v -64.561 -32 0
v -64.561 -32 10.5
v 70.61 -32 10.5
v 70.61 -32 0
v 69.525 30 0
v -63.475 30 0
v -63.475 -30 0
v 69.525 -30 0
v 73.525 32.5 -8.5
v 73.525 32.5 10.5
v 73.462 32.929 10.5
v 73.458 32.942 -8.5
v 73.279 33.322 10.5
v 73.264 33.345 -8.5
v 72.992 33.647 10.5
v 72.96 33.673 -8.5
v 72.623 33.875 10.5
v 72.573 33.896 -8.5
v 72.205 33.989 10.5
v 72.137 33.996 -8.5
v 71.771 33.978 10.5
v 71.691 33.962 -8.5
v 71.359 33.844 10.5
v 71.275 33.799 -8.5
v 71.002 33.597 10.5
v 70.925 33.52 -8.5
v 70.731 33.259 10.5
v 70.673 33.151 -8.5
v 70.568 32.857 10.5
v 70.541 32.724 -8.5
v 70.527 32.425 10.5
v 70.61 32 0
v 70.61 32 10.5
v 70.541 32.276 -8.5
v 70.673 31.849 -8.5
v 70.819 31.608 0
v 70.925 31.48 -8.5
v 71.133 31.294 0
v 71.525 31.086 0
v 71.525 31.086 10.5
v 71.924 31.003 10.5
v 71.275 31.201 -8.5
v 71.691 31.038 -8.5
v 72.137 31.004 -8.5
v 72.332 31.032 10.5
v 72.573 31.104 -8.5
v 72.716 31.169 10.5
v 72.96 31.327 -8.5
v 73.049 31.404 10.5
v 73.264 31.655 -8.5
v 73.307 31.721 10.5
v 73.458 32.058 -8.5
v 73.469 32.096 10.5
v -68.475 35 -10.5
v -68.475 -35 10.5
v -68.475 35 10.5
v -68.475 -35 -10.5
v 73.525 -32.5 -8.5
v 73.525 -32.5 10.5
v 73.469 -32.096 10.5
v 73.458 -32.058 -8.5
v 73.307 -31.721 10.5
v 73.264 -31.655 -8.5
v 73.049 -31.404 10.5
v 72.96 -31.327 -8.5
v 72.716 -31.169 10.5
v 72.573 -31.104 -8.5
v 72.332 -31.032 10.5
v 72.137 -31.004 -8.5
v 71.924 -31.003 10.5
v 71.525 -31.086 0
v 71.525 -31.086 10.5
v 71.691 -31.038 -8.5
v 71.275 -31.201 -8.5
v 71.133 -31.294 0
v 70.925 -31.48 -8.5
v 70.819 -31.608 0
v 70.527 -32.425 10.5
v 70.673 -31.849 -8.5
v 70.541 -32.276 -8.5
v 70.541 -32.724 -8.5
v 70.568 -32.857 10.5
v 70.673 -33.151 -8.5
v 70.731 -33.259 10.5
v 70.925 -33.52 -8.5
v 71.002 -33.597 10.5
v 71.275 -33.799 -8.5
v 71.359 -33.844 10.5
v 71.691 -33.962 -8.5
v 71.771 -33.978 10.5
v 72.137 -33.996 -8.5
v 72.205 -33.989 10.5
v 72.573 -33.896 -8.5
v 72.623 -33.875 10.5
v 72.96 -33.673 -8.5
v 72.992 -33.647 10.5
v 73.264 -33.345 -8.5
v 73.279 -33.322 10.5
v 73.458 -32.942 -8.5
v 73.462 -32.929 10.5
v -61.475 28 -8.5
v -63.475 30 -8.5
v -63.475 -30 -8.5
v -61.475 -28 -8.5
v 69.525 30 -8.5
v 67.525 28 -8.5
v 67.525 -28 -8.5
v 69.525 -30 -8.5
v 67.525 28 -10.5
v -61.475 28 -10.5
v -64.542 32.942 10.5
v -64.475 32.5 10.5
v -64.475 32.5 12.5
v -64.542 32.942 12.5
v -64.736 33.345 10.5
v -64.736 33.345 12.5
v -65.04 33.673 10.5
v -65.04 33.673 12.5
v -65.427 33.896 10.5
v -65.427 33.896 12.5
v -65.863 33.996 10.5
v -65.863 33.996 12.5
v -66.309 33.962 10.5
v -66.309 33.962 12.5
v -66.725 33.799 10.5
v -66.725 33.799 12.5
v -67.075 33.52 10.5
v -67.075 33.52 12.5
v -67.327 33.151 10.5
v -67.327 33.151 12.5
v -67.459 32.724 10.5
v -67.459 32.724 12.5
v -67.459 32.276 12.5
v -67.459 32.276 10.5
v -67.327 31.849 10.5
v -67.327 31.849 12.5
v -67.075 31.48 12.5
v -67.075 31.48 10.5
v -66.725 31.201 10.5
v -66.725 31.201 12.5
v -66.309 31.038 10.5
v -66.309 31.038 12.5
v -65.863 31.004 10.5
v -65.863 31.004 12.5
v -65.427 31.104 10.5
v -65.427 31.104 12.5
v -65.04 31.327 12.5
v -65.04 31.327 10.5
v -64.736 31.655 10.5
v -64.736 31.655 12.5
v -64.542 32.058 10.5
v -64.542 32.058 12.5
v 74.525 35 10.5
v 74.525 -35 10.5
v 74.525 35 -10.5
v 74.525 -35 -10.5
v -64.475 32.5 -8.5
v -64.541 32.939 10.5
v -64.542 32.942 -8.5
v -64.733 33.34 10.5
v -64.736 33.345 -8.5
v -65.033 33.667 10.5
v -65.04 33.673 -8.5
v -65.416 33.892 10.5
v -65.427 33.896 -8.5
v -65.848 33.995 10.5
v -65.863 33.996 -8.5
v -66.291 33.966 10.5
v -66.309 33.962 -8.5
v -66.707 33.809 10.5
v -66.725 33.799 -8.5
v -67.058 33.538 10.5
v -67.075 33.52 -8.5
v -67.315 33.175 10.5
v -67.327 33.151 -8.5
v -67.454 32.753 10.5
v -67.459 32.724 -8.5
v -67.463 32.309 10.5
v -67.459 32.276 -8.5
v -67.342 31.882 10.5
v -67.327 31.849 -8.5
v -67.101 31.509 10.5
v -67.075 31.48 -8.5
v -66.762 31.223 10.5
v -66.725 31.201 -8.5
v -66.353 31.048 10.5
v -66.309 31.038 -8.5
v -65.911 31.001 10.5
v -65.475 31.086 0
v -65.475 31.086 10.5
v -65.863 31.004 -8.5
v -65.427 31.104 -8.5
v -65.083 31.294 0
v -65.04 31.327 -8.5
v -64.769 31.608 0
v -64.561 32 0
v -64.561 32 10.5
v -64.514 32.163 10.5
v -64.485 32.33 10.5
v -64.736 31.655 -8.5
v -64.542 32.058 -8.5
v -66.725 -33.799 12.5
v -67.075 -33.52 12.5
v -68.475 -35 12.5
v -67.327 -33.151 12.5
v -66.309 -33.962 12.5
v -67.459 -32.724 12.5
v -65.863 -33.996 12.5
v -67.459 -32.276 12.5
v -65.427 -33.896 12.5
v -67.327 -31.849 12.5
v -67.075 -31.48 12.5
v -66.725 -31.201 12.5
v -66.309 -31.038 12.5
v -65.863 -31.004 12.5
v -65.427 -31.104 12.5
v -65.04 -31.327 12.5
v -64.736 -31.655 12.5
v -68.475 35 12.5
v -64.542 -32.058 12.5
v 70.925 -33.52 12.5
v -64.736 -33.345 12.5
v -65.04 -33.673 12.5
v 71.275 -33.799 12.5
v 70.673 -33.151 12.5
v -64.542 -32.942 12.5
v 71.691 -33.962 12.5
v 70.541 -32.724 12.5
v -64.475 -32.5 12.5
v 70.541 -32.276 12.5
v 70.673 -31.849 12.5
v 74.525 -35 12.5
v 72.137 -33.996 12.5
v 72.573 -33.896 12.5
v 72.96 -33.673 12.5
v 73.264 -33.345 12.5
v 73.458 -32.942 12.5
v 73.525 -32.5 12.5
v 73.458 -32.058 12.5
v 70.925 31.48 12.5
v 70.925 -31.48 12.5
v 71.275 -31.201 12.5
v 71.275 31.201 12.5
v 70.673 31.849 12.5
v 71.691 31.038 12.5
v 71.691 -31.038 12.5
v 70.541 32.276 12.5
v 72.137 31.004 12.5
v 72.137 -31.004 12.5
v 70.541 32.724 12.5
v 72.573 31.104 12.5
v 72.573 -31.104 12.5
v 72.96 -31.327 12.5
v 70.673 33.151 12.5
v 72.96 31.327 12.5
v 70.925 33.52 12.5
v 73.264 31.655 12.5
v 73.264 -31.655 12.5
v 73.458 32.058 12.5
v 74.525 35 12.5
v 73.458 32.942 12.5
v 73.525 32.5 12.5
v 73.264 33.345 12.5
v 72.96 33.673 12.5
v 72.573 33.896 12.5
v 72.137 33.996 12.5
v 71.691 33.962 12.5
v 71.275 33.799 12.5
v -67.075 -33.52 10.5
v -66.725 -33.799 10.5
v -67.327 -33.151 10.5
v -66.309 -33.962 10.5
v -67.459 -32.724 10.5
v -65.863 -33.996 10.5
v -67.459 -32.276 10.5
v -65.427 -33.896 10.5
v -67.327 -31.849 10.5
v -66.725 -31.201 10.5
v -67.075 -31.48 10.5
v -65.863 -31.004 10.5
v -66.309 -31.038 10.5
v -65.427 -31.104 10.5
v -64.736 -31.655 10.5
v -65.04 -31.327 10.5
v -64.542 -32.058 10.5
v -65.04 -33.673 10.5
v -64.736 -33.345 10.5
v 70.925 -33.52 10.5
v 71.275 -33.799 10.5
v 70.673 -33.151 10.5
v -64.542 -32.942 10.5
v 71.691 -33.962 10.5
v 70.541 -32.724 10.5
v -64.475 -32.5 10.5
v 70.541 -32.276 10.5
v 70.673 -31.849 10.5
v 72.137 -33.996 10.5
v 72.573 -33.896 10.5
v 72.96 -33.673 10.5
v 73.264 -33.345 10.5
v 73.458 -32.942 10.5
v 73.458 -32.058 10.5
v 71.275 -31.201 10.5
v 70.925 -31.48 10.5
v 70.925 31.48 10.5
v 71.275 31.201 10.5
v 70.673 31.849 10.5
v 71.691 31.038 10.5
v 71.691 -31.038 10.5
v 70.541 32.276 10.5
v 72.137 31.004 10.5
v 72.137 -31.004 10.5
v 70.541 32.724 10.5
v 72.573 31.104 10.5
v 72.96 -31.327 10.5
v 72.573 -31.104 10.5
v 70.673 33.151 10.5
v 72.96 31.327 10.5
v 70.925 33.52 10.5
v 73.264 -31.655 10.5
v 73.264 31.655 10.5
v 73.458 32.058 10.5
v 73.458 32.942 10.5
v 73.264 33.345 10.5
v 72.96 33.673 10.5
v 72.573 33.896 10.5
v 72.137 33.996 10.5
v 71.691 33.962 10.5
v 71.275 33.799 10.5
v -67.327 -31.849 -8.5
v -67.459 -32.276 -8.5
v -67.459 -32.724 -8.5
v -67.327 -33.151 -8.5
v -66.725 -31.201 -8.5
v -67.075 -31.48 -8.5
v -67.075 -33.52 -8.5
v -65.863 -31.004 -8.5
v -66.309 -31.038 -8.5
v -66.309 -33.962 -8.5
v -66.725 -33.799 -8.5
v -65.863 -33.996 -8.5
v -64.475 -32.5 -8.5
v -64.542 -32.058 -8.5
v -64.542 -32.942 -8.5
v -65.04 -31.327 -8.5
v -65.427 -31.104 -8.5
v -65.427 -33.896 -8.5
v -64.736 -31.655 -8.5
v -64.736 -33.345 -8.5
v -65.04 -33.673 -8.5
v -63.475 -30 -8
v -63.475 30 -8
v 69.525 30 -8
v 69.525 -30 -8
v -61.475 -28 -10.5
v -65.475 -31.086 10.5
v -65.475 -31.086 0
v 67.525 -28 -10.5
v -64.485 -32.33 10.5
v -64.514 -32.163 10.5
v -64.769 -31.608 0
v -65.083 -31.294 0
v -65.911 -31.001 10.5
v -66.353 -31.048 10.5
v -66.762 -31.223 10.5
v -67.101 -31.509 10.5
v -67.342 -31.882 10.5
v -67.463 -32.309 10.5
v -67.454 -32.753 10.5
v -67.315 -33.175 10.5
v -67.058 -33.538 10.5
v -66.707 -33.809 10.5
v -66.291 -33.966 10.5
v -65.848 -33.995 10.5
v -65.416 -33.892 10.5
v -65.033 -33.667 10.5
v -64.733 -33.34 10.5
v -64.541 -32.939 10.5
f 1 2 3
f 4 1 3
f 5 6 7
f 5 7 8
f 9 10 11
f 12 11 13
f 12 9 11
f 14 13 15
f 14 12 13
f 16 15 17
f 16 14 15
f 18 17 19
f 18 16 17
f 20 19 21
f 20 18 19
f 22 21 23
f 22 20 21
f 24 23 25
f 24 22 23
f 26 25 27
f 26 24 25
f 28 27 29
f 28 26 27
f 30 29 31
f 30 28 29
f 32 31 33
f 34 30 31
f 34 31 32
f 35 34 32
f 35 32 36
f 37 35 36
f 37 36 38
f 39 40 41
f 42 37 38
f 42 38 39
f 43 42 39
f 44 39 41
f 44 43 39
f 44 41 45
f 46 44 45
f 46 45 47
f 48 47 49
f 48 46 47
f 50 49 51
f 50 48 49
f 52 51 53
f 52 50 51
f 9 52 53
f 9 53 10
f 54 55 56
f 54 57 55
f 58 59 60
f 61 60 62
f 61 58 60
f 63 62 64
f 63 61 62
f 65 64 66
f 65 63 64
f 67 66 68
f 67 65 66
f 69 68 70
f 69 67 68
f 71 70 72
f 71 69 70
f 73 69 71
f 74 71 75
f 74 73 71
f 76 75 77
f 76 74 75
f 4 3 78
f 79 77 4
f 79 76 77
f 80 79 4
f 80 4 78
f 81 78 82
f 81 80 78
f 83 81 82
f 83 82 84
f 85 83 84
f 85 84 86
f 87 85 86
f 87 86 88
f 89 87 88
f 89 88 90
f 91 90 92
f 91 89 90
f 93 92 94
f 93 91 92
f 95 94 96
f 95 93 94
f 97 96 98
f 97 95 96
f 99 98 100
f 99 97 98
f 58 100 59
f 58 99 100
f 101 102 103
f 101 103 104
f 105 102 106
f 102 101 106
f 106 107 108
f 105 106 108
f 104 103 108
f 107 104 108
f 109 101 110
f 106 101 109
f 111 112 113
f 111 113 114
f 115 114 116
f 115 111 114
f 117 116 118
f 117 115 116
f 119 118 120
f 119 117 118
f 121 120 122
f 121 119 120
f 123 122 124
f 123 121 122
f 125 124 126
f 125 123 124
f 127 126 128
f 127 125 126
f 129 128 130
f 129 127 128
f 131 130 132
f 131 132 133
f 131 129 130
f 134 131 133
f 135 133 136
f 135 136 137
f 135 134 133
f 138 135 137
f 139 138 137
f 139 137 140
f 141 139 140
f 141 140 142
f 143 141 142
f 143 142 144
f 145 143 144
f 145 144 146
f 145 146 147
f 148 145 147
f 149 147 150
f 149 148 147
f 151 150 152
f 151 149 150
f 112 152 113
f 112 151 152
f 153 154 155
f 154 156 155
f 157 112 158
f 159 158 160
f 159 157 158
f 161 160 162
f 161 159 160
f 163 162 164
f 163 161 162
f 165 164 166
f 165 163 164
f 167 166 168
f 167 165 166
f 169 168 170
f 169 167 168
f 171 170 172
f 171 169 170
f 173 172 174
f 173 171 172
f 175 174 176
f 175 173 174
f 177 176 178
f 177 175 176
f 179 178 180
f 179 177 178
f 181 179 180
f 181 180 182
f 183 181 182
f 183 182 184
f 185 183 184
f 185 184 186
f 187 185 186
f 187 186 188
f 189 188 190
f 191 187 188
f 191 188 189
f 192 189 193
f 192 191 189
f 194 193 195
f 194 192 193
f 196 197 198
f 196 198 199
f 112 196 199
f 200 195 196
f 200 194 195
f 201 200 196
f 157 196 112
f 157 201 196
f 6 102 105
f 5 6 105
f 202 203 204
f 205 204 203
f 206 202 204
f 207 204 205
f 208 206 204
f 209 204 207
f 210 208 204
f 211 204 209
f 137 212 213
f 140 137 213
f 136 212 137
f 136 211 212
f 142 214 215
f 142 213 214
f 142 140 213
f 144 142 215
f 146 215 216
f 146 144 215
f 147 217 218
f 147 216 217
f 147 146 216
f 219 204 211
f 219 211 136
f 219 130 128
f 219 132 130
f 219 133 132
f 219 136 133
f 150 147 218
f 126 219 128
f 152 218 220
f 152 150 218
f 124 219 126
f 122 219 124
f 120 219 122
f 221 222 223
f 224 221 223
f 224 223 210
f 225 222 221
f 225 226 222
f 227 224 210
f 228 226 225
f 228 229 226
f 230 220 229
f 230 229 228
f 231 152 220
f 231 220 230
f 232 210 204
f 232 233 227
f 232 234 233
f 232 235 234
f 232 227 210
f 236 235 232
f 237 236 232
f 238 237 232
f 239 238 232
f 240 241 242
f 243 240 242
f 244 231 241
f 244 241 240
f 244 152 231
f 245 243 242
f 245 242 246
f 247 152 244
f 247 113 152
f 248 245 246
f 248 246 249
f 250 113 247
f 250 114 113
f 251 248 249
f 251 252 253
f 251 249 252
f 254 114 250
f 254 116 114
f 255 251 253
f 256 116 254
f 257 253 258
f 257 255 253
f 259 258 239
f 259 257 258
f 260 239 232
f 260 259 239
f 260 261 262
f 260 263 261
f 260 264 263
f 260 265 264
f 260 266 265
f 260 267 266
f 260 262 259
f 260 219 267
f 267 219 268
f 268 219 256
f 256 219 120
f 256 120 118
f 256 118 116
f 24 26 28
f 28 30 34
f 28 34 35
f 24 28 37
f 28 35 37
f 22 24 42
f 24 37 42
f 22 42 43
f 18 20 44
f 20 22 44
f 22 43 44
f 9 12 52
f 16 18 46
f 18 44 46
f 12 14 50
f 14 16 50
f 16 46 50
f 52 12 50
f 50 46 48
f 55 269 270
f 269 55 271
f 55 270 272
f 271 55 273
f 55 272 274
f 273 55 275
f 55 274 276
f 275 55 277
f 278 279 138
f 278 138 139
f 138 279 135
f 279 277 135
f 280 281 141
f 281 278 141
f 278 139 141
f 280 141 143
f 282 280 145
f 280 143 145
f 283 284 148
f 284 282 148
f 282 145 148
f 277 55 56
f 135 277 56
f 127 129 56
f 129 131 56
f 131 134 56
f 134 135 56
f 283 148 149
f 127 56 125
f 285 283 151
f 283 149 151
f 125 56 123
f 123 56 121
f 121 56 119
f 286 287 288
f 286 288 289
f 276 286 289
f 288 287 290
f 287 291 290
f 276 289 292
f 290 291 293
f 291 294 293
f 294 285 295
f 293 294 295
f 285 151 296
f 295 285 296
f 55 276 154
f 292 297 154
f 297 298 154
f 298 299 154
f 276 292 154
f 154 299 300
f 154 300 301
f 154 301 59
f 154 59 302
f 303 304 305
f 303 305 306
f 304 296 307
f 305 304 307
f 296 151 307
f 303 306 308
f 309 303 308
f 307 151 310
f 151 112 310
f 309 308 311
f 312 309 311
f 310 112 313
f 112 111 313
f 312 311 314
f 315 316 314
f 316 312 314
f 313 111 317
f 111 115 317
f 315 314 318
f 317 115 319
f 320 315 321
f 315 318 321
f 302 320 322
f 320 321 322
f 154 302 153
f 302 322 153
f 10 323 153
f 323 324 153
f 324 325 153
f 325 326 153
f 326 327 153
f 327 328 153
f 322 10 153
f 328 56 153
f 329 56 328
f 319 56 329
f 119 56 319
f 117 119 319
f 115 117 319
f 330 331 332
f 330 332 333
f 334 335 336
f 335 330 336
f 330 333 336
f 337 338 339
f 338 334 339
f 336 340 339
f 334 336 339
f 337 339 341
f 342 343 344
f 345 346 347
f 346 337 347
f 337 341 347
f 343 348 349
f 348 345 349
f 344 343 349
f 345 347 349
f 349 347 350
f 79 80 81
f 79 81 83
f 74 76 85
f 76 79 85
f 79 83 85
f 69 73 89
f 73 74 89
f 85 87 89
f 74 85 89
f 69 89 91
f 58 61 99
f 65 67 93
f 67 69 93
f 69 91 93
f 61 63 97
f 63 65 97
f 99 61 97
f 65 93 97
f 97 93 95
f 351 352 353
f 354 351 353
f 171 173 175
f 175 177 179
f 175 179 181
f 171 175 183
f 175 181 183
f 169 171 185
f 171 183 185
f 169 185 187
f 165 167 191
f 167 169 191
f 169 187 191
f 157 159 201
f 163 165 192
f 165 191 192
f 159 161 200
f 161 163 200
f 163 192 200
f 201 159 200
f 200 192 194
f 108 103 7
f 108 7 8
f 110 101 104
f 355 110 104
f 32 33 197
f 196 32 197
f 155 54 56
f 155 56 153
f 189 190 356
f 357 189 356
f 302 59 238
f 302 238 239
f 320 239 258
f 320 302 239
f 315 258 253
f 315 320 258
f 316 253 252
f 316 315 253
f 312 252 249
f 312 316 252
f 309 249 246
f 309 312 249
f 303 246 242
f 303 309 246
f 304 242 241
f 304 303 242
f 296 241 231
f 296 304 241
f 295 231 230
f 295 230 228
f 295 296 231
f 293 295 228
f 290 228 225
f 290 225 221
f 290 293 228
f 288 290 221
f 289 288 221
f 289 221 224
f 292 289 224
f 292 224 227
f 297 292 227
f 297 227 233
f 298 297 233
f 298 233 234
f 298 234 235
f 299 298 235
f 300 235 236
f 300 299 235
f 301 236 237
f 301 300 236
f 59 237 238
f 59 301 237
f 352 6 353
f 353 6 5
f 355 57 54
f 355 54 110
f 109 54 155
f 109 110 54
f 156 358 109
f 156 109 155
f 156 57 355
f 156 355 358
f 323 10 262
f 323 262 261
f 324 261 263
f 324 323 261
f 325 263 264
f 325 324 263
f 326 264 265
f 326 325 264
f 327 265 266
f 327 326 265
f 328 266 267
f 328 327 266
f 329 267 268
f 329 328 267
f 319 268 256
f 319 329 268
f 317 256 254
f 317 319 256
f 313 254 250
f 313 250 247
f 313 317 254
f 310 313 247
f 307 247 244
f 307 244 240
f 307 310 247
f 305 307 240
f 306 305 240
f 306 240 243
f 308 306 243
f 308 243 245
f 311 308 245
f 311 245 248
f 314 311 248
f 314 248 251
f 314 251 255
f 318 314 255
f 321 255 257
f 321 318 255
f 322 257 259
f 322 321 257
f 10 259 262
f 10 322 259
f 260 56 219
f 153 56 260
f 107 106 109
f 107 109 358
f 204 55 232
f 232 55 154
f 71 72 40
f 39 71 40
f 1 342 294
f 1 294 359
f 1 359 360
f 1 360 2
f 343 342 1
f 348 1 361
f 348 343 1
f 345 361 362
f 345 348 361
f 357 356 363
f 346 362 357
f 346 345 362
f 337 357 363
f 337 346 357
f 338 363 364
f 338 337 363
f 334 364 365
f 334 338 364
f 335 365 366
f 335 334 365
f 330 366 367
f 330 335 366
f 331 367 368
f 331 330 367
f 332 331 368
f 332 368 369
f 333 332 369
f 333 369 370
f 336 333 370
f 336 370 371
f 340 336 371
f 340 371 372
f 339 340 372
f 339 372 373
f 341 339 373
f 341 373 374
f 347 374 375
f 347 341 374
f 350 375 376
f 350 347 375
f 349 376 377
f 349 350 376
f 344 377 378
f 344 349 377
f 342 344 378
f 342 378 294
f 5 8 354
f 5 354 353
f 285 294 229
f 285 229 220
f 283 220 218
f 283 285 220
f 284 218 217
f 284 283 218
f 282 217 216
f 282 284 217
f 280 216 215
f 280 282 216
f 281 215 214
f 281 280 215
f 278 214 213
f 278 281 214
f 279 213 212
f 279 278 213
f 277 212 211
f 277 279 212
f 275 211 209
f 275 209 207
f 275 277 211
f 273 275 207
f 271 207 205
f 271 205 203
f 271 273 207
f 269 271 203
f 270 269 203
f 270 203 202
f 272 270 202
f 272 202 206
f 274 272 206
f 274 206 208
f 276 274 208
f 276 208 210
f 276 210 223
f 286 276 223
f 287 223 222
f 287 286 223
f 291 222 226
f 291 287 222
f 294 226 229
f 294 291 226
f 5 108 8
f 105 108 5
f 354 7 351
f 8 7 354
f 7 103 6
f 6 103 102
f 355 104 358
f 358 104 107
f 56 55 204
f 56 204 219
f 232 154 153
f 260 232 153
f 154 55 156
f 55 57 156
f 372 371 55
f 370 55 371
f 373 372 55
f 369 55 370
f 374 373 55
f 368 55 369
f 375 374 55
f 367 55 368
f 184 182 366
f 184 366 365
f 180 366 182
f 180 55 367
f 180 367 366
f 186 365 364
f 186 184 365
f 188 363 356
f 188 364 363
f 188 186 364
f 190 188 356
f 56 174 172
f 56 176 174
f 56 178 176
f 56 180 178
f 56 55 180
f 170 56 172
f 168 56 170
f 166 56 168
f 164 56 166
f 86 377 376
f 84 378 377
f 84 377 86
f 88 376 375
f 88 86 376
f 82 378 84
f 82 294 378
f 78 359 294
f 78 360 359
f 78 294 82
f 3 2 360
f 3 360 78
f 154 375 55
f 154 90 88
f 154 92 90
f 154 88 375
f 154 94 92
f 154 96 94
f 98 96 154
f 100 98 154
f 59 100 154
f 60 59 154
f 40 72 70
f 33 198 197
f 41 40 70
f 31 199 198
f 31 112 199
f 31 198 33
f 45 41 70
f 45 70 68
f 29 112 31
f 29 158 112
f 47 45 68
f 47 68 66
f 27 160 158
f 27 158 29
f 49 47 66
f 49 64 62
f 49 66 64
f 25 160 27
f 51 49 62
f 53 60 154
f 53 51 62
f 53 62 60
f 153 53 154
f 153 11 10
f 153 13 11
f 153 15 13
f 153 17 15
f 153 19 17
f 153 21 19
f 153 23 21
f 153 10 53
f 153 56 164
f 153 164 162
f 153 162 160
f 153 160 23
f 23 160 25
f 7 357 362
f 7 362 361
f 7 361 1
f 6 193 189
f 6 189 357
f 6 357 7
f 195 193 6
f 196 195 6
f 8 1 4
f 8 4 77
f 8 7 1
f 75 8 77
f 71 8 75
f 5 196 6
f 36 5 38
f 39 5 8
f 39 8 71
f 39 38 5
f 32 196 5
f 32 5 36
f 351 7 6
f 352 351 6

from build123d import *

# Parameters (mm, degrees)
F0_W     = 133
F0_H     = 60
F1_DEPTH = 8
F0_W_2   = 143
F0_H_2   = 70
F0_R     = 1.5
F2_DEPTH = 8.5
F3_W     = 143
F3_H     = 70
F3_W_2   = 129
F3_H_2   = 56
F4_DEPTH = 2
F5_DEPTH = 10.5
F6_W     = 133
F6_H     = 60
F7_DEPTH = 10.5
F8_W     = 143
F8_H     = 70
F8_R     = 1.5
F9_DEPTH = 2


# Not quite as in the source:
# - a feature names something its author has since deleted; it is built from what else it names


with BuildPart() as f1:
    # F0 (on Top) → F1 (new body)
    with BuildSketch(Plane.XY):
        with Locations((3.0246927018, 0)):
            Rectangle(F0_W, F0_H)
    extrude(amount=-F1_DEPTH)


with BuildPart() as f2:
    # F0 (on Top) → F2 (new body)
    with BuildSketch(Plane.XY):
        with Locations((3.0246927018, 0)):
            Rectangle(F0_W_2, F0_H_2)
        with Locations((-65.9753072982, -32.5)):
            Circle(F0_R, mode=Mode.SUBTRACT)
        with Locations((72.0246927018, -32.5)):
            Circle(F0_R, mode=Mode.SUBTRACT)
        with Locations((-65.9753072982, 32.5)):
            Circle(F0_R, mode=Mode.SUBTRACT)
        with Locations((3.0246927018, 0)):
            Rectangle(F0_W, F0_H, mode=Mode.SUBTRACT)
        with Locations((72.0246927018, 32.5)):
            Circle(F0_R, mode=Mode.SUBTRACT)
    extrude(amount=-F2_DEPTH)

    # F3 (on face) → F4 (join)
    with BuildSketch(Plane(origin=(0, 0, -8.5), x_dir=(1, 0, 0), z_dir=(0, 0, -1))):
        with Locations((3.0246927018, 0)):
            Rectangle(F3_W, F3_H)
        with Locations((3.0246927018, 0)):
            Rectangle(F3_W_2, F3_H_2, mode=Mode.SUBTRACT)
    extrude(amount=F4_DEPTH)

    # F0 (on Top) → F5 (join)
    with BuildSketch(Plane.XY):
        with Locations((3.0246927018, 0)):
            Rectangle(F0_W_2, F0_H_2)
        with Locations((-65.9753072982, -32.5)):
            Circle(F0_R, mode=Mode.SUBTRACT)
        with Locations((72.0246927018, -32.5)):
            Circle(F0_R, mode=Mode.SUBTRACT)
        with Locations((-65.9753072982, 32.5)):
            Circle(F0_R, mode=Mode.SUBTRACT)
        with Locations((3.0246927018, 0)):
            Rectangle(F0_W, F0_H, mode=Mode.SUBTRACT)
        with Locations((72.0246927018, 32.5)):
            Circle(F0_R, mode=Mode.SUBTRACT)
    extrude(amount=F5_DEPTH)

    # F6 (on face) → F7 (cut)
    with BuildSketch(Plane.XY.offset(10.5)):
        with BuildLine():
            ThreePointArc((-64.5610937358, 32), (-64.9146471264, 31.4393398282), (-65.4753072982, 31.0857864376))
            Line((-65.4753072982, 31.0857864376), (-65.4753072982, -31.0857864376))
            ThreePointArc((-65.4753072982, -31.0857864376), (-64.9146471264, -31.4393398282), (-64.5610937358, -32))
            Line((-64.5610937358, -32), (70.6104791395, -32))
            ThreePointArc((70.6104791395, -32), (70.9640325301, -31.4393398282), (71.5246927018, -31.0857864376))
            Line((71.5246927018, -31.0857864376), (71.5246927018, 31.0857864376))
            ThreePointArc((71.5246927018, 31.0857864376), (70.9640325301, 31.4393398282), (70.6104791395, 32))
            Line((70.6104791395, 32), (-64.5610937358, 32))
        make_face()
        with Locations((3.0246927018, 0)):
            Rectangle(F6_W, F6_H, mode=Mode.SUBTRACT)
    extrude(amount=-F7_DEPTH, mode=Mode.SUBTRACT)


with BuildPart() as f9:
    # F8 (on face) → F9 (new body)
    with BuildSketch(Plane.XY.offset(10.5)):
        with Locations((3.0246927018, 0)):
            Rectangle(F8_W, F8_H)
        with Locations((-65.9753072982, -32.5)):
            Circle(F8_R, mode=Mode.SUBTRACT)
        with Locations((72.0246927018, -32.5)):
            Circle(F8_R, mode=Mode.SUBTRACT)
        with Locations((-65.9753072982, 32.5)):
            Circle(F8_R, mode=Mode.SUBTRACT)
        with Locations((72.0246927018, 32.5)):
            Circle(F8_R, mode=Mode.SUBTRACT)
    extrude(amount=F9_DEPTH)


solid = Compound([f1.part, f2.part, f9.part])
